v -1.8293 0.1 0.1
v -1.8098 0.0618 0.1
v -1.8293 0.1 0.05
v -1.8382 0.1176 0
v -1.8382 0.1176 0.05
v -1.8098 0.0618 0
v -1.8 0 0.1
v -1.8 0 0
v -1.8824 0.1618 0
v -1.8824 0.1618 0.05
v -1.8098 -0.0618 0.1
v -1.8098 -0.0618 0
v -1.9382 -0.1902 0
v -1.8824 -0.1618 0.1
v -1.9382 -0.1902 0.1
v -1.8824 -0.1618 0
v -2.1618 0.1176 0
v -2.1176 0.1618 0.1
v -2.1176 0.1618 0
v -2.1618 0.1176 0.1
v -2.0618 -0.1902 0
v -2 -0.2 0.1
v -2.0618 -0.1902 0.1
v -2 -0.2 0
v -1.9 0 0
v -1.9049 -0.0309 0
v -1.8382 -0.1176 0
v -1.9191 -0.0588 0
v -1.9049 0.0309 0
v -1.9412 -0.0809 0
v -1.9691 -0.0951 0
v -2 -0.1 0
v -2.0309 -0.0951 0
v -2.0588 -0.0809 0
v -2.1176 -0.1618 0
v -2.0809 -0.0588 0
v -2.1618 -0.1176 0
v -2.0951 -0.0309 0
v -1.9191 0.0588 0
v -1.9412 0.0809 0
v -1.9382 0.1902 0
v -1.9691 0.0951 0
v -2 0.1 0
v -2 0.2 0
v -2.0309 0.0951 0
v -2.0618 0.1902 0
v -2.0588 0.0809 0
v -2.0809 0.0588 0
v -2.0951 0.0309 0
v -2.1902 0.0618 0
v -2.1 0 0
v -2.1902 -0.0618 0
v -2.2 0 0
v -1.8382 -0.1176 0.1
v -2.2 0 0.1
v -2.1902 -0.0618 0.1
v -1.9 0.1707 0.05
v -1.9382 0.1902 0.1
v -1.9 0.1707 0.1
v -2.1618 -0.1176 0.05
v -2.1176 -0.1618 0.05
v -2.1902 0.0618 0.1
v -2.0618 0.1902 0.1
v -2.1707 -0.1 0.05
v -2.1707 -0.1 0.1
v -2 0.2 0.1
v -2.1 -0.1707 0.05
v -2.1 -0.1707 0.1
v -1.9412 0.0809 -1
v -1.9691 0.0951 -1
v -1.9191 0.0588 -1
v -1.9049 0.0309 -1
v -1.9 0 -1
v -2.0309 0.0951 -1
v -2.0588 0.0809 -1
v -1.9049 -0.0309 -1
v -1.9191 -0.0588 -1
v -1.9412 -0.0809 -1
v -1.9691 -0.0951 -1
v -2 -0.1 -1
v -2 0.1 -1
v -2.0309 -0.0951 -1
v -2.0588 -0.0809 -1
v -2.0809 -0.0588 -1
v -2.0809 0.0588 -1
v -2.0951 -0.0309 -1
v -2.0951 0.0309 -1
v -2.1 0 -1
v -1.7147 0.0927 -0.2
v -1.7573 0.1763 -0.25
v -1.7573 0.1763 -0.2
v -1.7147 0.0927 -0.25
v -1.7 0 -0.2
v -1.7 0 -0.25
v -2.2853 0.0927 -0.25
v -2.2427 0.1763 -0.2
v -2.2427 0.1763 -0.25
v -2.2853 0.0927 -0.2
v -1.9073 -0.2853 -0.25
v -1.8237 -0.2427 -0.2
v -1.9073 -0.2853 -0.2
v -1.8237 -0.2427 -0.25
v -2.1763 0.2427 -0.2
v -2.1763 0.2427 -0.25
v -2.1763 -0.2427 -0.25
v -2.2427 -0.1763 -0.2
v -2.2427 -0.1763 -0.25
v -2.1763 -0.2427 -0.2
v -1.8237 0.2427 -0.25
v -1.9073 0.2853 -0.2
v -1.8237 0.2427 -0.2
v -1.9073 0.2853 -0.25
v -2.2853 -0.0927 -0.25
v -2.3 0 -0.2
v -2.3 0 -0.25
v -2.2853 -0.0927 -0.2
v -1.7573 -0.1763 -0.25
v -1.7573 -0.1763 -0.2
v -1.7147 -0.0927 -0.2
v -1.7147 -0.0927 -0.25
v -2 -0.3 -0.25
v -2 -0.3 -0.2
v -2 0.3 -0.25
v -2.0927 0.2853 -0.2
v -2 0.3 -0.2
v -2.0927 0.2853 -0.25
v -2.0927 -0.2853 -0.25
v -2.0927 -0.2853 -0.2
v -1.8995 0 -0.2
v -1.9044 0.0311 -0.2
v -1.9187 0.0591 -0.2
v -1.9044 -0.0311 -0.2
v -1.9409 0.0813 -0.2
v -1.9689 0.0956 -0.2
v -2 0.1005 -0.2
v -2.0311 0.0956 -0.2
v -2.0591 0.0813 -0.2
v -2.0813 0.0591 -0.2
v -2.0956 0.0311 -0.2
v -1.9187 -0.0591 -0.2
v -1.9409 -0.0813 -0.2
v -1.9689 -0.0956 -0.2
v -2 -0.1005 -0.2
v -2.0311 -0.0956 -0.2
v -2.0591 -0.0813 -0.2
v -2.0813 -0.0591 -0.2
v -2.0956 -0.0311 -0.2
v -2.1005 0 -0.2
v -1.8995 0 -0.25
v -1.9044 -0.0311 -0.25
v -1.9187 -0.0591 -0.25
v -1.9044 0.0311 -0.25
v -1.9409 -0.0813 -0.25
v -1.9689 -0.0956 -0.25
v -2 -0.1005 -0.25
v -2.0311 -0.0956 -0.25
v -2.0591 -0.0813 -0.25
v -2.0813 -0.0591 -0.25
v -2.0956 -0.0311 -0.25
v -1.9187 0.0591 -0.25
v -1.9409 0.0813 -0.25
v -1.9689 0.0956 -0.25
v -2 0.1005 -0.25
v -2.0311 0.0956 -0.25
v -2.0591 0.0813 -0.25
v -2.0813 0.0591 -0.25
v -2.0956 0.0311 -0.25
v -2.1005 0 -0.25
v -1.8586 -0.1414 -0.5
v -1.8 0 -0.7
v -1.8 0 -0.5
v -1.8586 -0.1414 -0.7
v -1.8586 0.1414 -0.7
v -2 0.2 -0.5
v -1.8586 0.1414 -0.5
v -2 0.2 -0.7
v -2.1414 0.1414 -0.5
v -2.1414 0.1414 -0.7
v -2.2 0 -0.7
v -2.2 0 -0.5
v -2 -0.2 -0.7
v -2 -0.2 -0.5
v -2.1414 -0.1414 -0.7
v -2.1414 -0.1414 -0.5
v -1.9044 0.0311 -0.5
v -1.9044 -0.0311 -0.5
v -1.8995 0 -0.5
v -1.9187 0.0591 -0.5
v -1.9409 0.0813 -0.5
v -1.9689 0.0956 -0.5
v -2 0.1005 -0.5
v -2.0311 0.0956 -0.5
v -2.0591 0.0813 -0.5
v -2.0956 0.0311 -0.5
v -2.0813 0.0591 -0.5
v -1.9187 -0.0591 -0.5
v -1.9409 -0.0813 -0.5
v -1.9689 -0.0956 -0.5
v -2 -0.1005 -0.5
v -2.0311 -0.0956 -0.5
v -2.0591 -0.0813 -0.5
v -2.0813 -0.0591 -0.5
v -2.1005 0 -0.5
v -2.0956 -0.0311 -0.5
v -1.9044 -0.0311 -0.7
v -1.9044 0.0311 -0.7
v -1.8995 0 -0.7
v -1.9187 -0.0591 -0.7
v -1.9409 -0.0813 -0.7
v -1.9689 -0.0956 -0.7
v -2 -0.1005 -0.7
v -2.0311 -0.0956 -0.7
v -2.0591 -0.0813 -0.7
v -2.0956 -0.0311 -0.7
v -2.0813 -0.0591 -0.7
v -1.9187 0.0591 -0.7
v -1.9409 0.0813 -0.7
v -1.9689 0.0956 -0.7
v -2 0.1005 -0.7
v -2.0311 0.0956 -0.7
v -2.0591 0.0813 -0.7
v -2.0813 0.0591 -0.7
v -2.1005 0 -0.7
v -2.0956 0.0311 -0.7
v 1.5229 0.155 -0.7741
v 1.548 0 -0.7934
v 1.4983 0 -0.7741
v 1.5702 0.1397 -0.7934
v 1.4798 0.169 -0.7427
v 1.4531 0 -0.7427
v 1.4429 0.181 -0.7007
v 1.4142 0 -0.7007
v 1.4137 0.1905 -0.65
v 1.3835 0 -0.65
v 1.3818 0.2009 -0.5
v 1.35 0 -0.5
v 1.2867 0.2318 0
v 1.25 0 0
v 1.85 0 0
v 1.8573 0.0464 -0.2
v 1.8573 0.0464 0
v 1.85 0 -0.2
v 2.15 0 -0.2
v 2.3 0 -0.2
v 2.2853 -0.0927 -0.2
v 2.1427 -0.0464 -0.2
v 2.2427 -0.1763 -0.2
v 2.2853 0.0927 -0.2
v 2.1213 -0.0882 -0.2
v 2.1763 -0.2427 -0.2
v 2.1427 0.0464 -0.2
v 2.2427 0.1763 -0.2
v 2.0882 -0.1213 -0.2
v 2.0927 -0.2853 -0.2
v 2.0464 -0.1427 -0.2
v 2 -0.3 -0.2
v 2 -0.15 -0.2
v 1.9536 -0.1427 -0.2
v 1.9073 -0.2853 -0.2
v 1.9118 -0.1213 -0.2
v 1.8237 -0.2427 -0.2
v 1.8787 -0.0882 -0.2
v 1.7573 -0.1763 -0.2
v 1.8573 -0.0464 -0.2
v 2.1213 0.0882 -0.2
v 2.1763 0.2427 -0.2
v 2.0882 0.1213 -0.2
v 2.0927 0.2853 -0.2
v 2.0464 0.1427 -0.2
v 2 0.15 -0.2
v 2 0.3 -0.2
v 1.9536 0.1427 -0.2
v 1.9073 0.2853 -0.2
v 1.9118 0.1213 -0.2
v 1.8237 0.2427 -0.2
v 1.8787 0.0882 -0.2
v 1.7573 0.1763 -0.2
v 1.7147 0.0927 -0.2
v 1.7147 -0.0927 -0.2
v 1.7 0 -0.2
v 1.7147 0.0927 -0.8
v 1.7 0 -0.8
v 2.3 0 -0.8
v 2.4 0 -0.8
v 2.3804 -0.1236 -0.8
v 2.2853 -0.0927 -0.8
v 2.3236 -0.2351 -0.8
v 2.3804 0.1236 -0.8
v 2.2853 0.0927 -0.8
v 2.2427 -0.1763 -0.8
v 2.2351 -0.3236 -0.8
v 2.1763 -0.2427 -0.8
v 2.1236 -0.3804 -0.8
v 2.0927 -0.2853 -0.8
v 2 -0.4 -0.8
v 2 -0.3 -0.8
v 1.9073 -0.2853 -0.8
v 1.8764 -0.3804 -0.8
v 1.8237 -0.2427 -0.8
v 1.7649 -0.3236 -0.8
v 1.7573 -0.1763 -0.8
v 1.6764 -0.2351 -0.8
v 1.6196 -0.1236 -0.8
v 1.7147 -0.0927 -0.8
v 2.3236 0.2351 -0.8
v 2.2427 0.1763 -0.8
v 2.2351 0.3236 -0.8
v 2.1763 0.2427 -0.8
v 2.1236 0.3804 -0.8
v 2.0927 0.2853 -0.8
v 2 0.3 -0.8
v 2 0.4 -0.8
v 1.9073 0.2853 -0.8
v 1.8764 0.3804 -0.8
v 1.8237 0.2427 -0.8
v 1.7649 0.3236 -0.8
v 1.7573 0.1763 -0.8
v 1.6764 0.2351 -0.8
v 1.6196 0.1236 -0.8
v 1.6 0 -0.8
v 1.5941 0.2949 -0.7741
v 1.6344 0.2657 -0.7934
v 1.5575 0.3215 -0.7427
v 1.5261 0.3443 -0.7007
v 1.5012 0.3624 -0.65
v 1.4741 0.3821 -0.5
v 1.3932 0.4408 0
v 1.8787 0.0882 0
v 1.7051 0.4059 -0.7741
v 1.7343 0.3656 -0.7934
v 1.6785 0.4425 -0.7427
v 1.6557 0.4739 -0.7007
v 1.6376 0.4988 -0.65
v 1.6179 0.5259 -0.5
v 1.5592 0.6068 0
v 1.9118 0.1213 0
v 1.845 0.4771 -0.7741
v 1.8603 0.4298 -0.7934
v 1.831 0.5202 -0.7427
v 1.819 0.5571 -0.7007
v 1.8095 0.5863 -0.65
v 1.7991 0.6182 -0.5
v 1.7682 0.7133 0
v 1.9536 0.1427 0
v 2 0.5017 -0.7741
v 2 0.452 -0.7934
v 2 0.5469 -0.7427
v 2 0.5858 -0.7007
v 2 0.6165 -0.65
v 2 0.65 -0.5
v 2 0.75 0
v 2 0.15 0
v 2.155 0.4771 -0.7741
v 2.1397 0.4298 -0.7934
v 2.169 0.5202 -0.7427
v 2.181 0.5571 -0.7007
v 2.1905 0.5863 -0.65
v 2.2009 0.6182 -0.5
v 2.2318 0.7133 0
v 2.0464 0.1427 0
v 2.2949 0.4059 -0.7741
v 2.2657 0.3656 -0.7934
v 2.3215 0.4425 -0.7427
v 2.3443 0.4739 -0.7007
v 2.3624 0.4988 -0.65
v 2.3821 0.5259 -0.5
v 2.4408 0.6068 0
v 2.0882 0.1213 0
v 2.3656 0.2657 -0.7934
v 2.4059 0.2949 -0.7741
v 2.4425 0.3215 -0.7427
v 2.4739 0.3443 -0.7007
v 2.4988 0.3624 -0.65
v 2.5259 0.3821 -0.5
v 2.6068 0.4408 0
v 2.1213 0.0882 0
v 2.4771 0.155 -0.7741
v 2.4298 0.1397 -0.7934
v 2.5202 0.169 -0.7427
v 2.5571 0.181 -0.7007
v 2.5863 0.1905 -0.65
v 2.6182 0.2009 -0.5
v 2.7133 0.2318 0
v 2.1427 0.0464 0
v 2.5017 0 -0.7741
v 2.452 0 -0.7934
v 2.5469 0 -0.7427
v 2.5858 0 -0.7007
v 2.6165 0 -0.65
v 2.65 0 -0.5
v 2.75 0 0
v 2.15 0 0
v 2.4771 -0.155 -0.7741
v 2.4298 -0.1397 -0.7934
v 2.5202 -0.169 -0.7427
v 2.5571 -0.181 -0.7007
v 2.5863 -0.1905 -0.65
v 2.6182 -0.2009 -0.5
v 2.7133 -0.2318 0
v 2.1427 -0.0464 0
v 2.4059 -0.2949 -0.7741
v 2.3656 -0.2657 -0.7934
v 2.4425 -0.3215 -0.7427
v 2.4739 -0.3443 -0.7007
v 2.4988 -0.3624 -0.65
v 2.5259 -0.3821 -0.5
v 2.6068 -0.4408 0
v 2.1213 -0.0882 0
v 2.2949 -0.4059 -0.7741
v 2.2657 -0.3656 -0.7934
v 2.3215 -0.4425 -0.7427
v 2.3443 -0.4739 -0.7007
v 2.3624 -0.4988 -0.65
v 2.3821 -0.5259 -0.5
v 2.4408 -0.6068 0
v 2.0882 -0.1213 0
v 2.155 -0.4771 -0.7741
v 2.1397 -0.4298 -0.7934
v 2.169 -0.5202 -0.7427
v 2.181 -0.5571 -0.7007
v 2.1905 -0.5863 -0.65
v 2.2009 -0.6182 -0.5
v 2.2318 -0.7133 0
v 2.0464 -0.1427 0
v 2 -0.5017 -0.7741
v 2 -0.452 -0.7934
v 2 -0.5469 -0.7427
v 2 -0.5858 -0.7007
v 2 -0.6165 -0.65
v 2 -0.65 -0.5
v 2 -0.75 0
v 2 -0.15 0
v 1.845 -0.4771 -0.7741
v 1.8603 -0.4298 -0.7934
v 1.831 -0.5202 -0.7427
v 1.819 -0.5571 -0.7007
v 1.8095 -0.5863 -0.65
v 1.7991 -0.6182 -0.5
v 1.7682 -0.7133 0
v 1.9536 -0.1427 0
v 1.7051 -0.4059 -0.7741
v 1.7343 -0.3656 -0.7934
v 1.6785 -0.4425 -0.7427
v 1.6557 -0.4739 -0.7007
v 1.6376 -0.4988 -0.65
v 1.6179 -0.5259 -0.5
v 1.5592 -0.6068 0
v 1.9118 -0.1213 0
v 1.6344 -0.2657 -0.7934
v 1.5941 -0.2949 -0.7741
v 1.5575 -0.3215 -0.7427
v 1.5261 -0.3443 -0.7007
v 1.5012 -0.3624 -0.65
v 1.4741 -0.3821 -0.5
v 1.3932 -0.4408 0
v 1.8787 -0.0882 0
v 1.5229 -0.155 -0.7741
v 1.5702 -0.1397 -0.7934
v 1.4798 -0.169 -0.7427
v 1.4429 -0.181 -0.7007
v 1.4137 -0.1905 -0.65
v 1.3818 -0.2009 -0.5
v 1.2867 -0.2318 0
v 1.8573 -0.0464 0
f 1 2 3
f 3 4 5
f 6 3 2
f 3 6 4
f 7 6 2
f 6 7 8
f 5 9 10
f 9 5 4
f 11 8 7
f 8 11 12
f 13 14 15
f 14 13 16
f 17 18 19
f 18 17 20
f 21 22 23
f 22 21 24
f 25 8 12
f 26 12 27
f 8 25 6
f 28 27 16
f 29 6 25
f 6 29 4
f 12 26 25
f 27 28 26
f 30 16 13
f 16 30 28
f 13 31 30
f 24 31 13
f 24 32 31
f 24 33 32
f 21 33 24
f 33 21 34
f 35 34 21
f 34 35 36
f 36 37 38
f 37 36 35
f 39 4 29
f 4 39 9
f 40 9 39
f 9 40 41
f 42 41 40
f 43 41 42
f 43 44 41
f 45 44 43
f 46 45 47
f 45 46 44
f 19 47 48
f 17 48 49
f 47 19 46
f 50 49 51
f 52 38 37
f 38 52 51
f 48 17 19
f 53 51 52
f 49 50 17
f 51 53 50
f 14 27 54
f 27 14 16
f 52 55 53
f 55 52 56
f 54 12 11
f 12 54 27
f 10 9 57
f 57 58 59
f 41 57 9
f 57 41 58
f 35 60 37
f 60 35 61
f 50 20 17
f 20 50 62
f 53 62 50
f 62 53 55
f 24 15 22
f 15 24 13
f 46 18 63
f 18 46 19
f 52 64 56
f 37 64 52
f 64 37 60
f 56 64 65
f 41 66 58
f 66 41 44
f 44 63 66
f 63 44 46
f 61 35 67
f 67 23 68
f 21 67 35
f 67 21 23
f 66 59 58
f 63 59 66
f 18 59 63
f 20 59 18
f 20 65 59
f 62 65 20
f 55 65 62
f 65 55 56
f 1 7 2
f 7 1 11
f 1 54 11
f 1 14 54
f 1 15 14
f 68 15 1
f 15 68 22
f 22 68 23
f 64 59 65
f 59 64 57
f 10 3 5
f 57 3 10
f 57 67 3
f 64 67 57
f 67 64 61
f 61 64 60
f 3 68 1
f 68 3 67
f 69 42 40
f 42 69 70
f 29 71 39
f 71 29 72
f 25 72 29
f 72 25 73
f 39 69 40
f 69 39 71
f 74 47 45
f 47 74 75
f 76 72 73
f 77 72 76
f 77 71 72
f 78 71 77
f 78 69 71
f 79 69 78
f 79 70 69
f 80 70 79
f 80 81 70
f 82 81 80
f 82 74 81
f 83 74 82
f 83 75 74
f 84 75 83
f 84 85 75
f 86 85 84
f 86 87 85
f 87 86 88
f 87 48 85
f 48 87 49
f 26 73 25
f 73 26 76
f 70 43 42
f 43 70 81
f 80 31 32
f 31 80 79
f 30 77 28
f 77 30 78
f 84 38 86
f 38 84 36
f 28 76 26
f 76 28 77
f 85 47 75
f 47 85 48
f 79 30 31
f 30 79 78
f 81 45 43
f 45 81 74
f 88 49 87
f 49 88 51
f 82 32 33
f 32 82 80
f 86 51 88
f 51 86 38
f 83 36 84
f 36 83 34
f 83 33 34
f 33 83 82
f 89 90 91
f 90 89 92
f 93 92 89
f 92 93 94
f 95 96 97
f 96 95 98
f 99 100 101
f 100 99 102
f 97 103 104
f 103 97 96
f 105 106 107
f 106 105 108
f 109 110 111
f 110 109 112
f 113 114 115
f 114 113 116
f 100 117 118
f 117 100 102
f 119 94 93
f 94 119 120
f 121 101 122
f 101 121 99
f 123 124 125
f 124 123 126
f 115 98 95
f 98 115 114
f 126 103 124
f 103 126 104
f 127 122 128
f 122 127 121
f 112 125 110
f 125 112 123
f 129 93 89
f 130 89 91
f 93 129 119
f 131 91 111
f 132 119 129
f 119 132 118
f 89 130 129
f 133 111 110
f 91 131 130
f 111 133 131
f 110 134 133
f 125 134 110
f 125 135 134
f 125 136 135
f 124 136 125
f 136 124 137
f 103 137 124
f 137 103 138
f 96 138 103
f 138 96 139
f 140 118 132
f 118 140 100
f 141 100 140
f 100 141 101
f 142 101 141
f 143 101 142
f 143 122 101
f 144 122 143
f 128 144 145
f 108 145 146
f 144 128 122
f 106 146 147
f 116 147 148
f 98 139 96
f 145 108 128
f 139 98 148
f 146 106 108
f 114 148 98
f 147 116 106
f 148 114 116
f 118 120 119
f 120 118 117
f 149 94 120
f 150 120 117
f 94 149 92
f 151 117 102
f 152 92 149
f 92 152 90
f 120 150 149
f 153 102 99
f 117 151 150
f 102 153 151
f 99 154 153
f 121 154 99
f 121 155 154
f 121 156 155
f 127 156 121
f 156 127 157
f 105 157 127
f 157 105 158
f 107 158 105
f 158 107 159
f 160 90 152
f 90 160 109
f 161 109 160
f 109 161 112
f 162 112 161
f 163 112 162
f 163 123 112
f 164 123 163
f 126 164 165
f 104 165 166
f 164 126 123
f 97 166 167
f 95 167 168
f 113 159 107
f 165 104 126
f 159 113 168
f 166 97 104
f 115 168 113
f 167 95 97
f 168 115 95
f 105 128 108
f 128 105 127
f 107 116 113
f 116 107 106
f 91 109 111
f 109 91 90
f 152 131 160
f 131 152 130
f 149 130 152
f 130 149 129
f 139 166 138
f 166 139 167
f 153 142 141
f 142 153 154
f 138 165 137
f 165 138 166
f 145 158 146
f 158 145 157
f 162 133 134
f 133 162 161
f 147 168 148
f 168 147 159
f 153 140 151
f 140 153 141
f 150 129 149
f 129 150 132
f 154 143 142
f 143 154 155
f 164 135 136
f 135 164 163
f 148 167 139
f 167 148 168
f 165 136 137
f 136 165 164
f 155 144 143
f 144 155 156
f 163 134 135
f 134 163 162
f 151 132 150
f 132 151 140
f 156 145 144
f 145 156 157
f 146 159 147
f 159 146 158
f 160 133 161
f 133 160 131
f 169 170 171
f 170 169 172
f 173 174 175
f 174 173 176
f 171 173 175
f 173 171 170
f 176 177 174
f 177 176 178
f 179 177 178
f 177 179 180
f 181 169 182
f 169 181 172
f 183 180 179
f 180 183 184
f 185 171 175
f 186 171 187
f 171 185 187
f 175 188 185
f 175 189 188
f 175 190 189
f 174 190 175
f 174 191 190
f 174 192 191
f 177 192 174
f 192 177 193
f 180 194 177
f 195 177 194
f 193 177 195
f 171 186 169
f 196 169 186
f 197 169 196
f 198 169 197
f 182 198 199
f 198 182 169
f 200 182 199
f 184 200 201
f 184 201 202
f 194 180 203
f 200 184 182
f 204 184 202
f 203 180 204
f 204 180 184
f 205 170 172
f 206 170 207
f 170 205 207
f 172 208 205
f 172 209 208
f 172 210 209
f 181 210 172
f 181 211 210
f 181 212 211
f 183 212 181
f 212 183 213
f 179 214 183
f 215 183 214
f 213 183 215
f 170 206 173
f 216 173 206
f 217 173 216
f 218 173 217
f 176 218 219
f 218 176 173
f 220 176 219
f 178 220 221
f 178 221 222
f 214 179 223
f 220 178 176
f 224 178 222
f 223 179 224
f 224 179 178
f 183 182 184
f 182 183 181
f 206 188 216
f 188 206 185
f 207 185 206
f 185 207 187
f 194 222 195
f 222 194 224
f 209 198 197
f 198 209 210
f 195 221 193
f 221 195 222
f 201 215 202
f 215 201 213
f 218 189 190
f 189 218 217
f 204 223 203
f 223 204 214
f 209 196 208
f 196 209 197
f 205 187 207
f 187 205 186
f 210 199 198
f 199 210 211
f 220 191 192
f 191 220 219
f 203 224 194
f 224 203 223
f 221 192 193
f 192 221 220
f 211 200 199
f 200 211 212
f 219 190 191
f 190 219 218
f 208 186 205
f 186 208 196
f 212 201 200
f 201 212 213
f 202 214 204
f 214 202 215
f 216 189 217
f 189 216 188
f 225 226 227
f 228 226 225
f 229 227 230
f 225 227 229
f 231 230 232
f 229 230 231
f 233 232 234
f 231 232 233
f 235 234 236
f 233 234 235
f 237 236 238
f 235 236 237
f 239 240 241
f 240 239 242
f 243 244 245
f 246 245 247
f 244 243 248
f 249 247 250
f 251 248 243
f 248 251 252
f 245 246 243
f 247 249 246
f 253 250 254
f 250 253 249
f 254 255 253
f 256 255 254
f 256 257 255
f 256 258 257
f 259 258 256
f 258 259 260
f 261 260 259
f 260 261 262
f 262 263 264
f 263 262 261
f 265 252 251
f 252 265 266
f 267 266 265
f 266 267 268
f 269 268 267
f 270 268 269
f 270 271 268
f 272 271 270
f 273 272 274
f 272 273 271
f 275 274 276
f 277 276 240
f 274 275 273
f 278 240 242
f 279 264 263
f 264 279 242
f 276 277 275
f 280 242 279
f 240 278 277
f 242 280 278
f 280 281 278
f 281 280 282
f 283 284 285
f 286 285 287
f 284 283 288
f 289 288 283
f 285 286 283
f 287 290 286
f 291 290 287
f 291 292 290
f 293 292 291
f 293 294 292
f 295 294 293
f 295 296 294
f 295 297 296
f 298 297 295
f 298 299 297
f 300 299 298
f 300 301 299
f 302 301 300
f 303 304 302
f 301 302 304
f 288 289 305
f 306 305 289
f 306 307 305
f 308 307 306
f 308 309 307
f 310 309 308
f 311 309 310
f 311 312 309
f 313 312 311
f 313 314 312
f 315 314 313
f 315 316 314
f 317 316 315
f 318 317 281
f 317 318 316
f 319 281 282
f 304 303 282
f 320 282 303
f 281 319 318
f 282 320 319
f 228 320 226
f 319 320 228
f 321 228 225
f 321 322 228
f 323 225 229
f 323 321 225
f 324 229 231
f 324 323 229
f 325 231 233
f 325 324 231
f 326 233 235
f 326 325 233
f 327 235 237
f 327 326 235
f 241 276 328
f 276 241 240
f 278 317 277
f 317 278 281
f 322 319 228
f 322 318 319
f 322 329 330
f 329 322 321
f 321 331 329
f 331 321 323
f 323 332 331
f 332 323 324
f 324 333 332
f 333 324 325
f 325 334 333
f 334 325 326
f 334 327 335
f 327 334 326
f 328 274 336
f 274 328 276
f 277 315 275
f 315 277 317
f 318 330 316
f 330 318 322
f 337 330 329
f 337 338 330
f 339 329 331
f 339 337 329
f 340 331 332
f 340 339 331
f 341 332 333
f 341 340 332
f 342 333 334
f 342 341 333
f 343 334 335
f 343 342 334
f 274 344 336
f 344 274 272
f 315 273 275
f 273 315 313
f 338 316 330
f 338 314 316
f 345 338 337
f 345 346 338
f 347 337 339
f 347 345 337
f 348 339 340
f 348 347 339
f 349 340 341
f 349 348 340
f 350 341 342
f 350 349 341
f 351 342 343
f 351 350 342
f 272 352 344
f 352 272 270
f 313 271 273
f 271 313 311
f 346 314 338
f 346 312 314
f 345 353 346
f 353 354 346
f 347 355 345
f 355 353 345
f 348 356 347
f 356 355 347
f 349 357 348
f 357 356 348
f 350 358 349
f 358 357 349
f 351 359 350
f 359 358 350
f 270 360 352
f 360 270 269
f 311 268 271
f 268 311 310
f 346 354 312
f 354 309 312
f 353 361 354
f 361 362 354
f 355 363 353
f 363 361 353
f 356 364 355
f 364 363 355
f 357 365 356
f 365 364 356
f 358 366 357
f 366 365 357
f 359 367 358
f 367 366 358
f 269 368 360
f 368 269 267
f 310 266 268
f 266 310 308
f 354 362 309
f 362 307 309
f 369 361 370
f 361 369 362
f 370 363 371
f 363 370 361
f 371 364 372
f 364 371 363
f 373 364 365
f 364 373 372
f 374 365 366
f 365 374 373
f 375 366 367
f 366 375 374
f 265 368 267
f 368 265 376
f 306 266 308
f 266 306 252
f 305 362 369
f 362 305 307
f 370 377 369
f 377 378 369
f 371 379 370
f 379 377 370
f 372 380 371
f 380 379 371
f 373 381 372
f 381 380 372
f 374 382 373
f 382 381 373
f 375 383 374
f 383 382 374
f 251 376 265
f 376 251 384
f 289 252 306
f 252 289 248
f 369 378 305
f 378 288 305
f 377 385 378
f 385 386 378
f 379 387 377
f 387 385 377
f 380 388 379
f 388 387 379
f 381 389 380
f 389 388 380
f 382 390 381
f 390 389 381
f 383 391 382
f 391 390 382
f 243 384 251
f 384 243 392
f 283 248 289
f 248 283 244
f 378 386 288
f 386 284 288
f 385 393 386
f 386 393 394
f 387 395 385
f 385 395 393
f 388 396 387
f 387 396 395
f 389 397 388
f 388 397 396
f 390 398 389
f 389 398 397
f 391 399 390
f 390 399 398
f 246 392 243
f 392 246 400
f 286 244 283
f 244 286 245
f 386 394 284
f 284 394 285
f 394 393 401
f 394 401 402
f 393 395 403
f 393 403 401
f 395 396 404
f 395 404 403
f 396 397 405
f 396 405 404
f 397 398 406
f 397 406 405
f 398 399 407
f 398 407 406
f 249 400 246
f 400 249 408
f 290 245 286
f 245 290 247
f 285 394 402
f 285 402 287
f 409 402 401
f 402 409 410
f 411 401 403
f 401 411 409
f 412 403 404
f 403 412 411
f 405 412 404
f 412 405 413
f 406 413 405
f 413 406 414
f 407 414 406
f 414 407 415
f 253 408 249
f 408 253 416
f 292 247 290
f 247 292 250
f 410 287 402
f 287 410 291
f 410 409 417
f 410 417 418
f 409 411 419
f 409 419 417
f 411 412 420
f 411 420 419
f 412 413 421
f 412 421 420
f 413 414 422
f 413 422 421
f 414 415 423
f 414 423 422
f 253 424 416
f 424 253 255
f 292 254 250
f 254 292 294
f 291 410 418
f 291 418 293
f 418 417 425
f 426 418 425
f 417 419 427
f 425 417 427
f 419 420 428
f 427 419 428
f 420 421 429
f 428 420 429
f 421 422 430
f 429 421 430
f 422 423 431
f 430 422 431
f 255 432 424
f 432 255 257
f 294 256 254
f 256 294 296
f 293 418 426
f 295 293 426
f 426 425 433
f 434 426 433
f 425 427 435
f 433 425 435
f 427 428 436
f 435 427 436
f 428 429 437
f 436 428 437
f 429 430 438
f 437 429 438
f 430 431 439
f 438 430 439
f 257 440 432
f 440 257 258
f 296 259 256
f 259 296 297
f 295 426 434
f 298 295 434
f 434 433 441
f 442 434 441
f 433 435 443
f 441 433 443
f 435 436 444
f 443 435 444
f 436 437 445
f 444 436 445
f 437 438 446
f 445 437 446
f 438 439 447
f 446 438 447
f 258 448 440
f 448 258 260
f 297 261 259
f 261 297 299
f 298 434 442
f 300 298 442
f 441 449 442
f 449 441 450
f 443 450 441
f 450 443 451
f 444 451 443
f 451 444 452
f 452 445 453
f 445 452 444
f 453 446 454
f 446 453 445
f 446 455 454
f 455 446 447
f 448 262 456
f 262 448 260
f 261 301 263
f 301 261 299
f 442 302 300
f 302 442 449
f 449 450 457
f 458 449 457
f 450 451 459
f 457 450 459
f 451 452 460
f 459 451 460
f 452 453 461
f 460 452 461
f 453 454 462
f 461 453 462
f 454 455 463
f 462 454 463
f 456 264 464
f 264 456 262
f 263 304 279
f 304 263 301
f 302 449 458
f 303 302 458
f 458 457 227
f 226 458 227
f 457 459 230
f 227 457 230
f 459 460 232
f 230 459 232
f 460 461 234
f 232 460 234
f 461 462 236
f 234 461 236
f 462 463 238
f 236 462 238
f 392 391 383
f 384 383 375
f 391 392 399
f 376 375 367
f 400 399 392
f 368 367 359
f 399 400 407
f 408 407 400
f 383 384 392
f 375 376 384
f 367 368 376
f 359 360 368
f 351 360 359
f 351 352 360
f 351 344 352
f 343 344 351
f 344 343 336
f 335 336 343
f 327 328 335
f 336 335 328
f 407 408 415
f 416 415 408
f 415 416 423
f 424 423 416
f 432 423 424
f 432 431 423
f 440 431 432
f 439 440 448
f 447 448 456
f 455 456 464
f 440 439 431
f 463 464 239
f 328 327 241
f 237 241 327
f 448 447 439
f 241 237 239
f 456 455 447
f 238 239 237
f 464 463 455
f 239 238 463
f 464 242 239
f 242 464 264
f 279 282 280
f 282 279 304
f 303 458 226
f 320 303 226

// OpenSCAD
module screw(h, d)
{
    difference()
    {
        cylinder(d = d + 0.2, h = d / 2);
        rotate([0, 0, 45]) translate([-d, -0.05, d / 4]) cube(size = [d * 2, 0.1, d / 4 + 0.001]);
    }
    translate([0, 0, -h]) cylinder(d = d, h = h);  
}

module washer(d)
{
    translate([0, 0, -0.05]) difference()
    {
        cylinder(d = d + 0.4, h = 0.05);
        translate([0, 0, -0.1]) cylinder(d = d + 0.001, h = 0.3);
    }
}

module nut(h, d)
{
    color("gold") translate([0, 0, -h]) difference()
    {
        cylinder(d = d + 0.2, h = h, $fn = 8);
        translate([0, 0, -0.1]) cylinder(d = d + 0.001, h = h + 0.2);
    }
}

module foot()
{
    n = min(60 / ($fn / 4), 45);
    a = [[0.15, 0], [0.75, 0], [0.65, -0.5]];
    b = [for (a = [30: n: 90]) [0.4 + 0.25 * cos(-a), -0.5 + 0.30 * sin(-a)]]; //[[0.4 + 0.25 * cos(-22), -0.5 + 0.30 * sin(-22)], [0.4 + 0.25 * cos(-45), -0.5 + 0.30 * sin(-45)], [0.4 + 0.25 * cos(-67), -0.5 + 0.30 * sin(-67)]];
    c = [[0.4, -0.8], [0.3, -0.8], [0.3, -0.2], [0.15, -0.2]];
    color("black") rotate_extrude() polygon(points = concat(a, b, c));
}

module test()
{
    $fn = 20;
    translate([-2, 0, 0])
    {
        screw(1, 0.2);
        translate([0, 0, -0.2]) washer(0.2);
        translate([0, 0, -0.5]) nut(0.2, 0.2);
    }
    translate([2, 0, 0]) foot();
}

test();
